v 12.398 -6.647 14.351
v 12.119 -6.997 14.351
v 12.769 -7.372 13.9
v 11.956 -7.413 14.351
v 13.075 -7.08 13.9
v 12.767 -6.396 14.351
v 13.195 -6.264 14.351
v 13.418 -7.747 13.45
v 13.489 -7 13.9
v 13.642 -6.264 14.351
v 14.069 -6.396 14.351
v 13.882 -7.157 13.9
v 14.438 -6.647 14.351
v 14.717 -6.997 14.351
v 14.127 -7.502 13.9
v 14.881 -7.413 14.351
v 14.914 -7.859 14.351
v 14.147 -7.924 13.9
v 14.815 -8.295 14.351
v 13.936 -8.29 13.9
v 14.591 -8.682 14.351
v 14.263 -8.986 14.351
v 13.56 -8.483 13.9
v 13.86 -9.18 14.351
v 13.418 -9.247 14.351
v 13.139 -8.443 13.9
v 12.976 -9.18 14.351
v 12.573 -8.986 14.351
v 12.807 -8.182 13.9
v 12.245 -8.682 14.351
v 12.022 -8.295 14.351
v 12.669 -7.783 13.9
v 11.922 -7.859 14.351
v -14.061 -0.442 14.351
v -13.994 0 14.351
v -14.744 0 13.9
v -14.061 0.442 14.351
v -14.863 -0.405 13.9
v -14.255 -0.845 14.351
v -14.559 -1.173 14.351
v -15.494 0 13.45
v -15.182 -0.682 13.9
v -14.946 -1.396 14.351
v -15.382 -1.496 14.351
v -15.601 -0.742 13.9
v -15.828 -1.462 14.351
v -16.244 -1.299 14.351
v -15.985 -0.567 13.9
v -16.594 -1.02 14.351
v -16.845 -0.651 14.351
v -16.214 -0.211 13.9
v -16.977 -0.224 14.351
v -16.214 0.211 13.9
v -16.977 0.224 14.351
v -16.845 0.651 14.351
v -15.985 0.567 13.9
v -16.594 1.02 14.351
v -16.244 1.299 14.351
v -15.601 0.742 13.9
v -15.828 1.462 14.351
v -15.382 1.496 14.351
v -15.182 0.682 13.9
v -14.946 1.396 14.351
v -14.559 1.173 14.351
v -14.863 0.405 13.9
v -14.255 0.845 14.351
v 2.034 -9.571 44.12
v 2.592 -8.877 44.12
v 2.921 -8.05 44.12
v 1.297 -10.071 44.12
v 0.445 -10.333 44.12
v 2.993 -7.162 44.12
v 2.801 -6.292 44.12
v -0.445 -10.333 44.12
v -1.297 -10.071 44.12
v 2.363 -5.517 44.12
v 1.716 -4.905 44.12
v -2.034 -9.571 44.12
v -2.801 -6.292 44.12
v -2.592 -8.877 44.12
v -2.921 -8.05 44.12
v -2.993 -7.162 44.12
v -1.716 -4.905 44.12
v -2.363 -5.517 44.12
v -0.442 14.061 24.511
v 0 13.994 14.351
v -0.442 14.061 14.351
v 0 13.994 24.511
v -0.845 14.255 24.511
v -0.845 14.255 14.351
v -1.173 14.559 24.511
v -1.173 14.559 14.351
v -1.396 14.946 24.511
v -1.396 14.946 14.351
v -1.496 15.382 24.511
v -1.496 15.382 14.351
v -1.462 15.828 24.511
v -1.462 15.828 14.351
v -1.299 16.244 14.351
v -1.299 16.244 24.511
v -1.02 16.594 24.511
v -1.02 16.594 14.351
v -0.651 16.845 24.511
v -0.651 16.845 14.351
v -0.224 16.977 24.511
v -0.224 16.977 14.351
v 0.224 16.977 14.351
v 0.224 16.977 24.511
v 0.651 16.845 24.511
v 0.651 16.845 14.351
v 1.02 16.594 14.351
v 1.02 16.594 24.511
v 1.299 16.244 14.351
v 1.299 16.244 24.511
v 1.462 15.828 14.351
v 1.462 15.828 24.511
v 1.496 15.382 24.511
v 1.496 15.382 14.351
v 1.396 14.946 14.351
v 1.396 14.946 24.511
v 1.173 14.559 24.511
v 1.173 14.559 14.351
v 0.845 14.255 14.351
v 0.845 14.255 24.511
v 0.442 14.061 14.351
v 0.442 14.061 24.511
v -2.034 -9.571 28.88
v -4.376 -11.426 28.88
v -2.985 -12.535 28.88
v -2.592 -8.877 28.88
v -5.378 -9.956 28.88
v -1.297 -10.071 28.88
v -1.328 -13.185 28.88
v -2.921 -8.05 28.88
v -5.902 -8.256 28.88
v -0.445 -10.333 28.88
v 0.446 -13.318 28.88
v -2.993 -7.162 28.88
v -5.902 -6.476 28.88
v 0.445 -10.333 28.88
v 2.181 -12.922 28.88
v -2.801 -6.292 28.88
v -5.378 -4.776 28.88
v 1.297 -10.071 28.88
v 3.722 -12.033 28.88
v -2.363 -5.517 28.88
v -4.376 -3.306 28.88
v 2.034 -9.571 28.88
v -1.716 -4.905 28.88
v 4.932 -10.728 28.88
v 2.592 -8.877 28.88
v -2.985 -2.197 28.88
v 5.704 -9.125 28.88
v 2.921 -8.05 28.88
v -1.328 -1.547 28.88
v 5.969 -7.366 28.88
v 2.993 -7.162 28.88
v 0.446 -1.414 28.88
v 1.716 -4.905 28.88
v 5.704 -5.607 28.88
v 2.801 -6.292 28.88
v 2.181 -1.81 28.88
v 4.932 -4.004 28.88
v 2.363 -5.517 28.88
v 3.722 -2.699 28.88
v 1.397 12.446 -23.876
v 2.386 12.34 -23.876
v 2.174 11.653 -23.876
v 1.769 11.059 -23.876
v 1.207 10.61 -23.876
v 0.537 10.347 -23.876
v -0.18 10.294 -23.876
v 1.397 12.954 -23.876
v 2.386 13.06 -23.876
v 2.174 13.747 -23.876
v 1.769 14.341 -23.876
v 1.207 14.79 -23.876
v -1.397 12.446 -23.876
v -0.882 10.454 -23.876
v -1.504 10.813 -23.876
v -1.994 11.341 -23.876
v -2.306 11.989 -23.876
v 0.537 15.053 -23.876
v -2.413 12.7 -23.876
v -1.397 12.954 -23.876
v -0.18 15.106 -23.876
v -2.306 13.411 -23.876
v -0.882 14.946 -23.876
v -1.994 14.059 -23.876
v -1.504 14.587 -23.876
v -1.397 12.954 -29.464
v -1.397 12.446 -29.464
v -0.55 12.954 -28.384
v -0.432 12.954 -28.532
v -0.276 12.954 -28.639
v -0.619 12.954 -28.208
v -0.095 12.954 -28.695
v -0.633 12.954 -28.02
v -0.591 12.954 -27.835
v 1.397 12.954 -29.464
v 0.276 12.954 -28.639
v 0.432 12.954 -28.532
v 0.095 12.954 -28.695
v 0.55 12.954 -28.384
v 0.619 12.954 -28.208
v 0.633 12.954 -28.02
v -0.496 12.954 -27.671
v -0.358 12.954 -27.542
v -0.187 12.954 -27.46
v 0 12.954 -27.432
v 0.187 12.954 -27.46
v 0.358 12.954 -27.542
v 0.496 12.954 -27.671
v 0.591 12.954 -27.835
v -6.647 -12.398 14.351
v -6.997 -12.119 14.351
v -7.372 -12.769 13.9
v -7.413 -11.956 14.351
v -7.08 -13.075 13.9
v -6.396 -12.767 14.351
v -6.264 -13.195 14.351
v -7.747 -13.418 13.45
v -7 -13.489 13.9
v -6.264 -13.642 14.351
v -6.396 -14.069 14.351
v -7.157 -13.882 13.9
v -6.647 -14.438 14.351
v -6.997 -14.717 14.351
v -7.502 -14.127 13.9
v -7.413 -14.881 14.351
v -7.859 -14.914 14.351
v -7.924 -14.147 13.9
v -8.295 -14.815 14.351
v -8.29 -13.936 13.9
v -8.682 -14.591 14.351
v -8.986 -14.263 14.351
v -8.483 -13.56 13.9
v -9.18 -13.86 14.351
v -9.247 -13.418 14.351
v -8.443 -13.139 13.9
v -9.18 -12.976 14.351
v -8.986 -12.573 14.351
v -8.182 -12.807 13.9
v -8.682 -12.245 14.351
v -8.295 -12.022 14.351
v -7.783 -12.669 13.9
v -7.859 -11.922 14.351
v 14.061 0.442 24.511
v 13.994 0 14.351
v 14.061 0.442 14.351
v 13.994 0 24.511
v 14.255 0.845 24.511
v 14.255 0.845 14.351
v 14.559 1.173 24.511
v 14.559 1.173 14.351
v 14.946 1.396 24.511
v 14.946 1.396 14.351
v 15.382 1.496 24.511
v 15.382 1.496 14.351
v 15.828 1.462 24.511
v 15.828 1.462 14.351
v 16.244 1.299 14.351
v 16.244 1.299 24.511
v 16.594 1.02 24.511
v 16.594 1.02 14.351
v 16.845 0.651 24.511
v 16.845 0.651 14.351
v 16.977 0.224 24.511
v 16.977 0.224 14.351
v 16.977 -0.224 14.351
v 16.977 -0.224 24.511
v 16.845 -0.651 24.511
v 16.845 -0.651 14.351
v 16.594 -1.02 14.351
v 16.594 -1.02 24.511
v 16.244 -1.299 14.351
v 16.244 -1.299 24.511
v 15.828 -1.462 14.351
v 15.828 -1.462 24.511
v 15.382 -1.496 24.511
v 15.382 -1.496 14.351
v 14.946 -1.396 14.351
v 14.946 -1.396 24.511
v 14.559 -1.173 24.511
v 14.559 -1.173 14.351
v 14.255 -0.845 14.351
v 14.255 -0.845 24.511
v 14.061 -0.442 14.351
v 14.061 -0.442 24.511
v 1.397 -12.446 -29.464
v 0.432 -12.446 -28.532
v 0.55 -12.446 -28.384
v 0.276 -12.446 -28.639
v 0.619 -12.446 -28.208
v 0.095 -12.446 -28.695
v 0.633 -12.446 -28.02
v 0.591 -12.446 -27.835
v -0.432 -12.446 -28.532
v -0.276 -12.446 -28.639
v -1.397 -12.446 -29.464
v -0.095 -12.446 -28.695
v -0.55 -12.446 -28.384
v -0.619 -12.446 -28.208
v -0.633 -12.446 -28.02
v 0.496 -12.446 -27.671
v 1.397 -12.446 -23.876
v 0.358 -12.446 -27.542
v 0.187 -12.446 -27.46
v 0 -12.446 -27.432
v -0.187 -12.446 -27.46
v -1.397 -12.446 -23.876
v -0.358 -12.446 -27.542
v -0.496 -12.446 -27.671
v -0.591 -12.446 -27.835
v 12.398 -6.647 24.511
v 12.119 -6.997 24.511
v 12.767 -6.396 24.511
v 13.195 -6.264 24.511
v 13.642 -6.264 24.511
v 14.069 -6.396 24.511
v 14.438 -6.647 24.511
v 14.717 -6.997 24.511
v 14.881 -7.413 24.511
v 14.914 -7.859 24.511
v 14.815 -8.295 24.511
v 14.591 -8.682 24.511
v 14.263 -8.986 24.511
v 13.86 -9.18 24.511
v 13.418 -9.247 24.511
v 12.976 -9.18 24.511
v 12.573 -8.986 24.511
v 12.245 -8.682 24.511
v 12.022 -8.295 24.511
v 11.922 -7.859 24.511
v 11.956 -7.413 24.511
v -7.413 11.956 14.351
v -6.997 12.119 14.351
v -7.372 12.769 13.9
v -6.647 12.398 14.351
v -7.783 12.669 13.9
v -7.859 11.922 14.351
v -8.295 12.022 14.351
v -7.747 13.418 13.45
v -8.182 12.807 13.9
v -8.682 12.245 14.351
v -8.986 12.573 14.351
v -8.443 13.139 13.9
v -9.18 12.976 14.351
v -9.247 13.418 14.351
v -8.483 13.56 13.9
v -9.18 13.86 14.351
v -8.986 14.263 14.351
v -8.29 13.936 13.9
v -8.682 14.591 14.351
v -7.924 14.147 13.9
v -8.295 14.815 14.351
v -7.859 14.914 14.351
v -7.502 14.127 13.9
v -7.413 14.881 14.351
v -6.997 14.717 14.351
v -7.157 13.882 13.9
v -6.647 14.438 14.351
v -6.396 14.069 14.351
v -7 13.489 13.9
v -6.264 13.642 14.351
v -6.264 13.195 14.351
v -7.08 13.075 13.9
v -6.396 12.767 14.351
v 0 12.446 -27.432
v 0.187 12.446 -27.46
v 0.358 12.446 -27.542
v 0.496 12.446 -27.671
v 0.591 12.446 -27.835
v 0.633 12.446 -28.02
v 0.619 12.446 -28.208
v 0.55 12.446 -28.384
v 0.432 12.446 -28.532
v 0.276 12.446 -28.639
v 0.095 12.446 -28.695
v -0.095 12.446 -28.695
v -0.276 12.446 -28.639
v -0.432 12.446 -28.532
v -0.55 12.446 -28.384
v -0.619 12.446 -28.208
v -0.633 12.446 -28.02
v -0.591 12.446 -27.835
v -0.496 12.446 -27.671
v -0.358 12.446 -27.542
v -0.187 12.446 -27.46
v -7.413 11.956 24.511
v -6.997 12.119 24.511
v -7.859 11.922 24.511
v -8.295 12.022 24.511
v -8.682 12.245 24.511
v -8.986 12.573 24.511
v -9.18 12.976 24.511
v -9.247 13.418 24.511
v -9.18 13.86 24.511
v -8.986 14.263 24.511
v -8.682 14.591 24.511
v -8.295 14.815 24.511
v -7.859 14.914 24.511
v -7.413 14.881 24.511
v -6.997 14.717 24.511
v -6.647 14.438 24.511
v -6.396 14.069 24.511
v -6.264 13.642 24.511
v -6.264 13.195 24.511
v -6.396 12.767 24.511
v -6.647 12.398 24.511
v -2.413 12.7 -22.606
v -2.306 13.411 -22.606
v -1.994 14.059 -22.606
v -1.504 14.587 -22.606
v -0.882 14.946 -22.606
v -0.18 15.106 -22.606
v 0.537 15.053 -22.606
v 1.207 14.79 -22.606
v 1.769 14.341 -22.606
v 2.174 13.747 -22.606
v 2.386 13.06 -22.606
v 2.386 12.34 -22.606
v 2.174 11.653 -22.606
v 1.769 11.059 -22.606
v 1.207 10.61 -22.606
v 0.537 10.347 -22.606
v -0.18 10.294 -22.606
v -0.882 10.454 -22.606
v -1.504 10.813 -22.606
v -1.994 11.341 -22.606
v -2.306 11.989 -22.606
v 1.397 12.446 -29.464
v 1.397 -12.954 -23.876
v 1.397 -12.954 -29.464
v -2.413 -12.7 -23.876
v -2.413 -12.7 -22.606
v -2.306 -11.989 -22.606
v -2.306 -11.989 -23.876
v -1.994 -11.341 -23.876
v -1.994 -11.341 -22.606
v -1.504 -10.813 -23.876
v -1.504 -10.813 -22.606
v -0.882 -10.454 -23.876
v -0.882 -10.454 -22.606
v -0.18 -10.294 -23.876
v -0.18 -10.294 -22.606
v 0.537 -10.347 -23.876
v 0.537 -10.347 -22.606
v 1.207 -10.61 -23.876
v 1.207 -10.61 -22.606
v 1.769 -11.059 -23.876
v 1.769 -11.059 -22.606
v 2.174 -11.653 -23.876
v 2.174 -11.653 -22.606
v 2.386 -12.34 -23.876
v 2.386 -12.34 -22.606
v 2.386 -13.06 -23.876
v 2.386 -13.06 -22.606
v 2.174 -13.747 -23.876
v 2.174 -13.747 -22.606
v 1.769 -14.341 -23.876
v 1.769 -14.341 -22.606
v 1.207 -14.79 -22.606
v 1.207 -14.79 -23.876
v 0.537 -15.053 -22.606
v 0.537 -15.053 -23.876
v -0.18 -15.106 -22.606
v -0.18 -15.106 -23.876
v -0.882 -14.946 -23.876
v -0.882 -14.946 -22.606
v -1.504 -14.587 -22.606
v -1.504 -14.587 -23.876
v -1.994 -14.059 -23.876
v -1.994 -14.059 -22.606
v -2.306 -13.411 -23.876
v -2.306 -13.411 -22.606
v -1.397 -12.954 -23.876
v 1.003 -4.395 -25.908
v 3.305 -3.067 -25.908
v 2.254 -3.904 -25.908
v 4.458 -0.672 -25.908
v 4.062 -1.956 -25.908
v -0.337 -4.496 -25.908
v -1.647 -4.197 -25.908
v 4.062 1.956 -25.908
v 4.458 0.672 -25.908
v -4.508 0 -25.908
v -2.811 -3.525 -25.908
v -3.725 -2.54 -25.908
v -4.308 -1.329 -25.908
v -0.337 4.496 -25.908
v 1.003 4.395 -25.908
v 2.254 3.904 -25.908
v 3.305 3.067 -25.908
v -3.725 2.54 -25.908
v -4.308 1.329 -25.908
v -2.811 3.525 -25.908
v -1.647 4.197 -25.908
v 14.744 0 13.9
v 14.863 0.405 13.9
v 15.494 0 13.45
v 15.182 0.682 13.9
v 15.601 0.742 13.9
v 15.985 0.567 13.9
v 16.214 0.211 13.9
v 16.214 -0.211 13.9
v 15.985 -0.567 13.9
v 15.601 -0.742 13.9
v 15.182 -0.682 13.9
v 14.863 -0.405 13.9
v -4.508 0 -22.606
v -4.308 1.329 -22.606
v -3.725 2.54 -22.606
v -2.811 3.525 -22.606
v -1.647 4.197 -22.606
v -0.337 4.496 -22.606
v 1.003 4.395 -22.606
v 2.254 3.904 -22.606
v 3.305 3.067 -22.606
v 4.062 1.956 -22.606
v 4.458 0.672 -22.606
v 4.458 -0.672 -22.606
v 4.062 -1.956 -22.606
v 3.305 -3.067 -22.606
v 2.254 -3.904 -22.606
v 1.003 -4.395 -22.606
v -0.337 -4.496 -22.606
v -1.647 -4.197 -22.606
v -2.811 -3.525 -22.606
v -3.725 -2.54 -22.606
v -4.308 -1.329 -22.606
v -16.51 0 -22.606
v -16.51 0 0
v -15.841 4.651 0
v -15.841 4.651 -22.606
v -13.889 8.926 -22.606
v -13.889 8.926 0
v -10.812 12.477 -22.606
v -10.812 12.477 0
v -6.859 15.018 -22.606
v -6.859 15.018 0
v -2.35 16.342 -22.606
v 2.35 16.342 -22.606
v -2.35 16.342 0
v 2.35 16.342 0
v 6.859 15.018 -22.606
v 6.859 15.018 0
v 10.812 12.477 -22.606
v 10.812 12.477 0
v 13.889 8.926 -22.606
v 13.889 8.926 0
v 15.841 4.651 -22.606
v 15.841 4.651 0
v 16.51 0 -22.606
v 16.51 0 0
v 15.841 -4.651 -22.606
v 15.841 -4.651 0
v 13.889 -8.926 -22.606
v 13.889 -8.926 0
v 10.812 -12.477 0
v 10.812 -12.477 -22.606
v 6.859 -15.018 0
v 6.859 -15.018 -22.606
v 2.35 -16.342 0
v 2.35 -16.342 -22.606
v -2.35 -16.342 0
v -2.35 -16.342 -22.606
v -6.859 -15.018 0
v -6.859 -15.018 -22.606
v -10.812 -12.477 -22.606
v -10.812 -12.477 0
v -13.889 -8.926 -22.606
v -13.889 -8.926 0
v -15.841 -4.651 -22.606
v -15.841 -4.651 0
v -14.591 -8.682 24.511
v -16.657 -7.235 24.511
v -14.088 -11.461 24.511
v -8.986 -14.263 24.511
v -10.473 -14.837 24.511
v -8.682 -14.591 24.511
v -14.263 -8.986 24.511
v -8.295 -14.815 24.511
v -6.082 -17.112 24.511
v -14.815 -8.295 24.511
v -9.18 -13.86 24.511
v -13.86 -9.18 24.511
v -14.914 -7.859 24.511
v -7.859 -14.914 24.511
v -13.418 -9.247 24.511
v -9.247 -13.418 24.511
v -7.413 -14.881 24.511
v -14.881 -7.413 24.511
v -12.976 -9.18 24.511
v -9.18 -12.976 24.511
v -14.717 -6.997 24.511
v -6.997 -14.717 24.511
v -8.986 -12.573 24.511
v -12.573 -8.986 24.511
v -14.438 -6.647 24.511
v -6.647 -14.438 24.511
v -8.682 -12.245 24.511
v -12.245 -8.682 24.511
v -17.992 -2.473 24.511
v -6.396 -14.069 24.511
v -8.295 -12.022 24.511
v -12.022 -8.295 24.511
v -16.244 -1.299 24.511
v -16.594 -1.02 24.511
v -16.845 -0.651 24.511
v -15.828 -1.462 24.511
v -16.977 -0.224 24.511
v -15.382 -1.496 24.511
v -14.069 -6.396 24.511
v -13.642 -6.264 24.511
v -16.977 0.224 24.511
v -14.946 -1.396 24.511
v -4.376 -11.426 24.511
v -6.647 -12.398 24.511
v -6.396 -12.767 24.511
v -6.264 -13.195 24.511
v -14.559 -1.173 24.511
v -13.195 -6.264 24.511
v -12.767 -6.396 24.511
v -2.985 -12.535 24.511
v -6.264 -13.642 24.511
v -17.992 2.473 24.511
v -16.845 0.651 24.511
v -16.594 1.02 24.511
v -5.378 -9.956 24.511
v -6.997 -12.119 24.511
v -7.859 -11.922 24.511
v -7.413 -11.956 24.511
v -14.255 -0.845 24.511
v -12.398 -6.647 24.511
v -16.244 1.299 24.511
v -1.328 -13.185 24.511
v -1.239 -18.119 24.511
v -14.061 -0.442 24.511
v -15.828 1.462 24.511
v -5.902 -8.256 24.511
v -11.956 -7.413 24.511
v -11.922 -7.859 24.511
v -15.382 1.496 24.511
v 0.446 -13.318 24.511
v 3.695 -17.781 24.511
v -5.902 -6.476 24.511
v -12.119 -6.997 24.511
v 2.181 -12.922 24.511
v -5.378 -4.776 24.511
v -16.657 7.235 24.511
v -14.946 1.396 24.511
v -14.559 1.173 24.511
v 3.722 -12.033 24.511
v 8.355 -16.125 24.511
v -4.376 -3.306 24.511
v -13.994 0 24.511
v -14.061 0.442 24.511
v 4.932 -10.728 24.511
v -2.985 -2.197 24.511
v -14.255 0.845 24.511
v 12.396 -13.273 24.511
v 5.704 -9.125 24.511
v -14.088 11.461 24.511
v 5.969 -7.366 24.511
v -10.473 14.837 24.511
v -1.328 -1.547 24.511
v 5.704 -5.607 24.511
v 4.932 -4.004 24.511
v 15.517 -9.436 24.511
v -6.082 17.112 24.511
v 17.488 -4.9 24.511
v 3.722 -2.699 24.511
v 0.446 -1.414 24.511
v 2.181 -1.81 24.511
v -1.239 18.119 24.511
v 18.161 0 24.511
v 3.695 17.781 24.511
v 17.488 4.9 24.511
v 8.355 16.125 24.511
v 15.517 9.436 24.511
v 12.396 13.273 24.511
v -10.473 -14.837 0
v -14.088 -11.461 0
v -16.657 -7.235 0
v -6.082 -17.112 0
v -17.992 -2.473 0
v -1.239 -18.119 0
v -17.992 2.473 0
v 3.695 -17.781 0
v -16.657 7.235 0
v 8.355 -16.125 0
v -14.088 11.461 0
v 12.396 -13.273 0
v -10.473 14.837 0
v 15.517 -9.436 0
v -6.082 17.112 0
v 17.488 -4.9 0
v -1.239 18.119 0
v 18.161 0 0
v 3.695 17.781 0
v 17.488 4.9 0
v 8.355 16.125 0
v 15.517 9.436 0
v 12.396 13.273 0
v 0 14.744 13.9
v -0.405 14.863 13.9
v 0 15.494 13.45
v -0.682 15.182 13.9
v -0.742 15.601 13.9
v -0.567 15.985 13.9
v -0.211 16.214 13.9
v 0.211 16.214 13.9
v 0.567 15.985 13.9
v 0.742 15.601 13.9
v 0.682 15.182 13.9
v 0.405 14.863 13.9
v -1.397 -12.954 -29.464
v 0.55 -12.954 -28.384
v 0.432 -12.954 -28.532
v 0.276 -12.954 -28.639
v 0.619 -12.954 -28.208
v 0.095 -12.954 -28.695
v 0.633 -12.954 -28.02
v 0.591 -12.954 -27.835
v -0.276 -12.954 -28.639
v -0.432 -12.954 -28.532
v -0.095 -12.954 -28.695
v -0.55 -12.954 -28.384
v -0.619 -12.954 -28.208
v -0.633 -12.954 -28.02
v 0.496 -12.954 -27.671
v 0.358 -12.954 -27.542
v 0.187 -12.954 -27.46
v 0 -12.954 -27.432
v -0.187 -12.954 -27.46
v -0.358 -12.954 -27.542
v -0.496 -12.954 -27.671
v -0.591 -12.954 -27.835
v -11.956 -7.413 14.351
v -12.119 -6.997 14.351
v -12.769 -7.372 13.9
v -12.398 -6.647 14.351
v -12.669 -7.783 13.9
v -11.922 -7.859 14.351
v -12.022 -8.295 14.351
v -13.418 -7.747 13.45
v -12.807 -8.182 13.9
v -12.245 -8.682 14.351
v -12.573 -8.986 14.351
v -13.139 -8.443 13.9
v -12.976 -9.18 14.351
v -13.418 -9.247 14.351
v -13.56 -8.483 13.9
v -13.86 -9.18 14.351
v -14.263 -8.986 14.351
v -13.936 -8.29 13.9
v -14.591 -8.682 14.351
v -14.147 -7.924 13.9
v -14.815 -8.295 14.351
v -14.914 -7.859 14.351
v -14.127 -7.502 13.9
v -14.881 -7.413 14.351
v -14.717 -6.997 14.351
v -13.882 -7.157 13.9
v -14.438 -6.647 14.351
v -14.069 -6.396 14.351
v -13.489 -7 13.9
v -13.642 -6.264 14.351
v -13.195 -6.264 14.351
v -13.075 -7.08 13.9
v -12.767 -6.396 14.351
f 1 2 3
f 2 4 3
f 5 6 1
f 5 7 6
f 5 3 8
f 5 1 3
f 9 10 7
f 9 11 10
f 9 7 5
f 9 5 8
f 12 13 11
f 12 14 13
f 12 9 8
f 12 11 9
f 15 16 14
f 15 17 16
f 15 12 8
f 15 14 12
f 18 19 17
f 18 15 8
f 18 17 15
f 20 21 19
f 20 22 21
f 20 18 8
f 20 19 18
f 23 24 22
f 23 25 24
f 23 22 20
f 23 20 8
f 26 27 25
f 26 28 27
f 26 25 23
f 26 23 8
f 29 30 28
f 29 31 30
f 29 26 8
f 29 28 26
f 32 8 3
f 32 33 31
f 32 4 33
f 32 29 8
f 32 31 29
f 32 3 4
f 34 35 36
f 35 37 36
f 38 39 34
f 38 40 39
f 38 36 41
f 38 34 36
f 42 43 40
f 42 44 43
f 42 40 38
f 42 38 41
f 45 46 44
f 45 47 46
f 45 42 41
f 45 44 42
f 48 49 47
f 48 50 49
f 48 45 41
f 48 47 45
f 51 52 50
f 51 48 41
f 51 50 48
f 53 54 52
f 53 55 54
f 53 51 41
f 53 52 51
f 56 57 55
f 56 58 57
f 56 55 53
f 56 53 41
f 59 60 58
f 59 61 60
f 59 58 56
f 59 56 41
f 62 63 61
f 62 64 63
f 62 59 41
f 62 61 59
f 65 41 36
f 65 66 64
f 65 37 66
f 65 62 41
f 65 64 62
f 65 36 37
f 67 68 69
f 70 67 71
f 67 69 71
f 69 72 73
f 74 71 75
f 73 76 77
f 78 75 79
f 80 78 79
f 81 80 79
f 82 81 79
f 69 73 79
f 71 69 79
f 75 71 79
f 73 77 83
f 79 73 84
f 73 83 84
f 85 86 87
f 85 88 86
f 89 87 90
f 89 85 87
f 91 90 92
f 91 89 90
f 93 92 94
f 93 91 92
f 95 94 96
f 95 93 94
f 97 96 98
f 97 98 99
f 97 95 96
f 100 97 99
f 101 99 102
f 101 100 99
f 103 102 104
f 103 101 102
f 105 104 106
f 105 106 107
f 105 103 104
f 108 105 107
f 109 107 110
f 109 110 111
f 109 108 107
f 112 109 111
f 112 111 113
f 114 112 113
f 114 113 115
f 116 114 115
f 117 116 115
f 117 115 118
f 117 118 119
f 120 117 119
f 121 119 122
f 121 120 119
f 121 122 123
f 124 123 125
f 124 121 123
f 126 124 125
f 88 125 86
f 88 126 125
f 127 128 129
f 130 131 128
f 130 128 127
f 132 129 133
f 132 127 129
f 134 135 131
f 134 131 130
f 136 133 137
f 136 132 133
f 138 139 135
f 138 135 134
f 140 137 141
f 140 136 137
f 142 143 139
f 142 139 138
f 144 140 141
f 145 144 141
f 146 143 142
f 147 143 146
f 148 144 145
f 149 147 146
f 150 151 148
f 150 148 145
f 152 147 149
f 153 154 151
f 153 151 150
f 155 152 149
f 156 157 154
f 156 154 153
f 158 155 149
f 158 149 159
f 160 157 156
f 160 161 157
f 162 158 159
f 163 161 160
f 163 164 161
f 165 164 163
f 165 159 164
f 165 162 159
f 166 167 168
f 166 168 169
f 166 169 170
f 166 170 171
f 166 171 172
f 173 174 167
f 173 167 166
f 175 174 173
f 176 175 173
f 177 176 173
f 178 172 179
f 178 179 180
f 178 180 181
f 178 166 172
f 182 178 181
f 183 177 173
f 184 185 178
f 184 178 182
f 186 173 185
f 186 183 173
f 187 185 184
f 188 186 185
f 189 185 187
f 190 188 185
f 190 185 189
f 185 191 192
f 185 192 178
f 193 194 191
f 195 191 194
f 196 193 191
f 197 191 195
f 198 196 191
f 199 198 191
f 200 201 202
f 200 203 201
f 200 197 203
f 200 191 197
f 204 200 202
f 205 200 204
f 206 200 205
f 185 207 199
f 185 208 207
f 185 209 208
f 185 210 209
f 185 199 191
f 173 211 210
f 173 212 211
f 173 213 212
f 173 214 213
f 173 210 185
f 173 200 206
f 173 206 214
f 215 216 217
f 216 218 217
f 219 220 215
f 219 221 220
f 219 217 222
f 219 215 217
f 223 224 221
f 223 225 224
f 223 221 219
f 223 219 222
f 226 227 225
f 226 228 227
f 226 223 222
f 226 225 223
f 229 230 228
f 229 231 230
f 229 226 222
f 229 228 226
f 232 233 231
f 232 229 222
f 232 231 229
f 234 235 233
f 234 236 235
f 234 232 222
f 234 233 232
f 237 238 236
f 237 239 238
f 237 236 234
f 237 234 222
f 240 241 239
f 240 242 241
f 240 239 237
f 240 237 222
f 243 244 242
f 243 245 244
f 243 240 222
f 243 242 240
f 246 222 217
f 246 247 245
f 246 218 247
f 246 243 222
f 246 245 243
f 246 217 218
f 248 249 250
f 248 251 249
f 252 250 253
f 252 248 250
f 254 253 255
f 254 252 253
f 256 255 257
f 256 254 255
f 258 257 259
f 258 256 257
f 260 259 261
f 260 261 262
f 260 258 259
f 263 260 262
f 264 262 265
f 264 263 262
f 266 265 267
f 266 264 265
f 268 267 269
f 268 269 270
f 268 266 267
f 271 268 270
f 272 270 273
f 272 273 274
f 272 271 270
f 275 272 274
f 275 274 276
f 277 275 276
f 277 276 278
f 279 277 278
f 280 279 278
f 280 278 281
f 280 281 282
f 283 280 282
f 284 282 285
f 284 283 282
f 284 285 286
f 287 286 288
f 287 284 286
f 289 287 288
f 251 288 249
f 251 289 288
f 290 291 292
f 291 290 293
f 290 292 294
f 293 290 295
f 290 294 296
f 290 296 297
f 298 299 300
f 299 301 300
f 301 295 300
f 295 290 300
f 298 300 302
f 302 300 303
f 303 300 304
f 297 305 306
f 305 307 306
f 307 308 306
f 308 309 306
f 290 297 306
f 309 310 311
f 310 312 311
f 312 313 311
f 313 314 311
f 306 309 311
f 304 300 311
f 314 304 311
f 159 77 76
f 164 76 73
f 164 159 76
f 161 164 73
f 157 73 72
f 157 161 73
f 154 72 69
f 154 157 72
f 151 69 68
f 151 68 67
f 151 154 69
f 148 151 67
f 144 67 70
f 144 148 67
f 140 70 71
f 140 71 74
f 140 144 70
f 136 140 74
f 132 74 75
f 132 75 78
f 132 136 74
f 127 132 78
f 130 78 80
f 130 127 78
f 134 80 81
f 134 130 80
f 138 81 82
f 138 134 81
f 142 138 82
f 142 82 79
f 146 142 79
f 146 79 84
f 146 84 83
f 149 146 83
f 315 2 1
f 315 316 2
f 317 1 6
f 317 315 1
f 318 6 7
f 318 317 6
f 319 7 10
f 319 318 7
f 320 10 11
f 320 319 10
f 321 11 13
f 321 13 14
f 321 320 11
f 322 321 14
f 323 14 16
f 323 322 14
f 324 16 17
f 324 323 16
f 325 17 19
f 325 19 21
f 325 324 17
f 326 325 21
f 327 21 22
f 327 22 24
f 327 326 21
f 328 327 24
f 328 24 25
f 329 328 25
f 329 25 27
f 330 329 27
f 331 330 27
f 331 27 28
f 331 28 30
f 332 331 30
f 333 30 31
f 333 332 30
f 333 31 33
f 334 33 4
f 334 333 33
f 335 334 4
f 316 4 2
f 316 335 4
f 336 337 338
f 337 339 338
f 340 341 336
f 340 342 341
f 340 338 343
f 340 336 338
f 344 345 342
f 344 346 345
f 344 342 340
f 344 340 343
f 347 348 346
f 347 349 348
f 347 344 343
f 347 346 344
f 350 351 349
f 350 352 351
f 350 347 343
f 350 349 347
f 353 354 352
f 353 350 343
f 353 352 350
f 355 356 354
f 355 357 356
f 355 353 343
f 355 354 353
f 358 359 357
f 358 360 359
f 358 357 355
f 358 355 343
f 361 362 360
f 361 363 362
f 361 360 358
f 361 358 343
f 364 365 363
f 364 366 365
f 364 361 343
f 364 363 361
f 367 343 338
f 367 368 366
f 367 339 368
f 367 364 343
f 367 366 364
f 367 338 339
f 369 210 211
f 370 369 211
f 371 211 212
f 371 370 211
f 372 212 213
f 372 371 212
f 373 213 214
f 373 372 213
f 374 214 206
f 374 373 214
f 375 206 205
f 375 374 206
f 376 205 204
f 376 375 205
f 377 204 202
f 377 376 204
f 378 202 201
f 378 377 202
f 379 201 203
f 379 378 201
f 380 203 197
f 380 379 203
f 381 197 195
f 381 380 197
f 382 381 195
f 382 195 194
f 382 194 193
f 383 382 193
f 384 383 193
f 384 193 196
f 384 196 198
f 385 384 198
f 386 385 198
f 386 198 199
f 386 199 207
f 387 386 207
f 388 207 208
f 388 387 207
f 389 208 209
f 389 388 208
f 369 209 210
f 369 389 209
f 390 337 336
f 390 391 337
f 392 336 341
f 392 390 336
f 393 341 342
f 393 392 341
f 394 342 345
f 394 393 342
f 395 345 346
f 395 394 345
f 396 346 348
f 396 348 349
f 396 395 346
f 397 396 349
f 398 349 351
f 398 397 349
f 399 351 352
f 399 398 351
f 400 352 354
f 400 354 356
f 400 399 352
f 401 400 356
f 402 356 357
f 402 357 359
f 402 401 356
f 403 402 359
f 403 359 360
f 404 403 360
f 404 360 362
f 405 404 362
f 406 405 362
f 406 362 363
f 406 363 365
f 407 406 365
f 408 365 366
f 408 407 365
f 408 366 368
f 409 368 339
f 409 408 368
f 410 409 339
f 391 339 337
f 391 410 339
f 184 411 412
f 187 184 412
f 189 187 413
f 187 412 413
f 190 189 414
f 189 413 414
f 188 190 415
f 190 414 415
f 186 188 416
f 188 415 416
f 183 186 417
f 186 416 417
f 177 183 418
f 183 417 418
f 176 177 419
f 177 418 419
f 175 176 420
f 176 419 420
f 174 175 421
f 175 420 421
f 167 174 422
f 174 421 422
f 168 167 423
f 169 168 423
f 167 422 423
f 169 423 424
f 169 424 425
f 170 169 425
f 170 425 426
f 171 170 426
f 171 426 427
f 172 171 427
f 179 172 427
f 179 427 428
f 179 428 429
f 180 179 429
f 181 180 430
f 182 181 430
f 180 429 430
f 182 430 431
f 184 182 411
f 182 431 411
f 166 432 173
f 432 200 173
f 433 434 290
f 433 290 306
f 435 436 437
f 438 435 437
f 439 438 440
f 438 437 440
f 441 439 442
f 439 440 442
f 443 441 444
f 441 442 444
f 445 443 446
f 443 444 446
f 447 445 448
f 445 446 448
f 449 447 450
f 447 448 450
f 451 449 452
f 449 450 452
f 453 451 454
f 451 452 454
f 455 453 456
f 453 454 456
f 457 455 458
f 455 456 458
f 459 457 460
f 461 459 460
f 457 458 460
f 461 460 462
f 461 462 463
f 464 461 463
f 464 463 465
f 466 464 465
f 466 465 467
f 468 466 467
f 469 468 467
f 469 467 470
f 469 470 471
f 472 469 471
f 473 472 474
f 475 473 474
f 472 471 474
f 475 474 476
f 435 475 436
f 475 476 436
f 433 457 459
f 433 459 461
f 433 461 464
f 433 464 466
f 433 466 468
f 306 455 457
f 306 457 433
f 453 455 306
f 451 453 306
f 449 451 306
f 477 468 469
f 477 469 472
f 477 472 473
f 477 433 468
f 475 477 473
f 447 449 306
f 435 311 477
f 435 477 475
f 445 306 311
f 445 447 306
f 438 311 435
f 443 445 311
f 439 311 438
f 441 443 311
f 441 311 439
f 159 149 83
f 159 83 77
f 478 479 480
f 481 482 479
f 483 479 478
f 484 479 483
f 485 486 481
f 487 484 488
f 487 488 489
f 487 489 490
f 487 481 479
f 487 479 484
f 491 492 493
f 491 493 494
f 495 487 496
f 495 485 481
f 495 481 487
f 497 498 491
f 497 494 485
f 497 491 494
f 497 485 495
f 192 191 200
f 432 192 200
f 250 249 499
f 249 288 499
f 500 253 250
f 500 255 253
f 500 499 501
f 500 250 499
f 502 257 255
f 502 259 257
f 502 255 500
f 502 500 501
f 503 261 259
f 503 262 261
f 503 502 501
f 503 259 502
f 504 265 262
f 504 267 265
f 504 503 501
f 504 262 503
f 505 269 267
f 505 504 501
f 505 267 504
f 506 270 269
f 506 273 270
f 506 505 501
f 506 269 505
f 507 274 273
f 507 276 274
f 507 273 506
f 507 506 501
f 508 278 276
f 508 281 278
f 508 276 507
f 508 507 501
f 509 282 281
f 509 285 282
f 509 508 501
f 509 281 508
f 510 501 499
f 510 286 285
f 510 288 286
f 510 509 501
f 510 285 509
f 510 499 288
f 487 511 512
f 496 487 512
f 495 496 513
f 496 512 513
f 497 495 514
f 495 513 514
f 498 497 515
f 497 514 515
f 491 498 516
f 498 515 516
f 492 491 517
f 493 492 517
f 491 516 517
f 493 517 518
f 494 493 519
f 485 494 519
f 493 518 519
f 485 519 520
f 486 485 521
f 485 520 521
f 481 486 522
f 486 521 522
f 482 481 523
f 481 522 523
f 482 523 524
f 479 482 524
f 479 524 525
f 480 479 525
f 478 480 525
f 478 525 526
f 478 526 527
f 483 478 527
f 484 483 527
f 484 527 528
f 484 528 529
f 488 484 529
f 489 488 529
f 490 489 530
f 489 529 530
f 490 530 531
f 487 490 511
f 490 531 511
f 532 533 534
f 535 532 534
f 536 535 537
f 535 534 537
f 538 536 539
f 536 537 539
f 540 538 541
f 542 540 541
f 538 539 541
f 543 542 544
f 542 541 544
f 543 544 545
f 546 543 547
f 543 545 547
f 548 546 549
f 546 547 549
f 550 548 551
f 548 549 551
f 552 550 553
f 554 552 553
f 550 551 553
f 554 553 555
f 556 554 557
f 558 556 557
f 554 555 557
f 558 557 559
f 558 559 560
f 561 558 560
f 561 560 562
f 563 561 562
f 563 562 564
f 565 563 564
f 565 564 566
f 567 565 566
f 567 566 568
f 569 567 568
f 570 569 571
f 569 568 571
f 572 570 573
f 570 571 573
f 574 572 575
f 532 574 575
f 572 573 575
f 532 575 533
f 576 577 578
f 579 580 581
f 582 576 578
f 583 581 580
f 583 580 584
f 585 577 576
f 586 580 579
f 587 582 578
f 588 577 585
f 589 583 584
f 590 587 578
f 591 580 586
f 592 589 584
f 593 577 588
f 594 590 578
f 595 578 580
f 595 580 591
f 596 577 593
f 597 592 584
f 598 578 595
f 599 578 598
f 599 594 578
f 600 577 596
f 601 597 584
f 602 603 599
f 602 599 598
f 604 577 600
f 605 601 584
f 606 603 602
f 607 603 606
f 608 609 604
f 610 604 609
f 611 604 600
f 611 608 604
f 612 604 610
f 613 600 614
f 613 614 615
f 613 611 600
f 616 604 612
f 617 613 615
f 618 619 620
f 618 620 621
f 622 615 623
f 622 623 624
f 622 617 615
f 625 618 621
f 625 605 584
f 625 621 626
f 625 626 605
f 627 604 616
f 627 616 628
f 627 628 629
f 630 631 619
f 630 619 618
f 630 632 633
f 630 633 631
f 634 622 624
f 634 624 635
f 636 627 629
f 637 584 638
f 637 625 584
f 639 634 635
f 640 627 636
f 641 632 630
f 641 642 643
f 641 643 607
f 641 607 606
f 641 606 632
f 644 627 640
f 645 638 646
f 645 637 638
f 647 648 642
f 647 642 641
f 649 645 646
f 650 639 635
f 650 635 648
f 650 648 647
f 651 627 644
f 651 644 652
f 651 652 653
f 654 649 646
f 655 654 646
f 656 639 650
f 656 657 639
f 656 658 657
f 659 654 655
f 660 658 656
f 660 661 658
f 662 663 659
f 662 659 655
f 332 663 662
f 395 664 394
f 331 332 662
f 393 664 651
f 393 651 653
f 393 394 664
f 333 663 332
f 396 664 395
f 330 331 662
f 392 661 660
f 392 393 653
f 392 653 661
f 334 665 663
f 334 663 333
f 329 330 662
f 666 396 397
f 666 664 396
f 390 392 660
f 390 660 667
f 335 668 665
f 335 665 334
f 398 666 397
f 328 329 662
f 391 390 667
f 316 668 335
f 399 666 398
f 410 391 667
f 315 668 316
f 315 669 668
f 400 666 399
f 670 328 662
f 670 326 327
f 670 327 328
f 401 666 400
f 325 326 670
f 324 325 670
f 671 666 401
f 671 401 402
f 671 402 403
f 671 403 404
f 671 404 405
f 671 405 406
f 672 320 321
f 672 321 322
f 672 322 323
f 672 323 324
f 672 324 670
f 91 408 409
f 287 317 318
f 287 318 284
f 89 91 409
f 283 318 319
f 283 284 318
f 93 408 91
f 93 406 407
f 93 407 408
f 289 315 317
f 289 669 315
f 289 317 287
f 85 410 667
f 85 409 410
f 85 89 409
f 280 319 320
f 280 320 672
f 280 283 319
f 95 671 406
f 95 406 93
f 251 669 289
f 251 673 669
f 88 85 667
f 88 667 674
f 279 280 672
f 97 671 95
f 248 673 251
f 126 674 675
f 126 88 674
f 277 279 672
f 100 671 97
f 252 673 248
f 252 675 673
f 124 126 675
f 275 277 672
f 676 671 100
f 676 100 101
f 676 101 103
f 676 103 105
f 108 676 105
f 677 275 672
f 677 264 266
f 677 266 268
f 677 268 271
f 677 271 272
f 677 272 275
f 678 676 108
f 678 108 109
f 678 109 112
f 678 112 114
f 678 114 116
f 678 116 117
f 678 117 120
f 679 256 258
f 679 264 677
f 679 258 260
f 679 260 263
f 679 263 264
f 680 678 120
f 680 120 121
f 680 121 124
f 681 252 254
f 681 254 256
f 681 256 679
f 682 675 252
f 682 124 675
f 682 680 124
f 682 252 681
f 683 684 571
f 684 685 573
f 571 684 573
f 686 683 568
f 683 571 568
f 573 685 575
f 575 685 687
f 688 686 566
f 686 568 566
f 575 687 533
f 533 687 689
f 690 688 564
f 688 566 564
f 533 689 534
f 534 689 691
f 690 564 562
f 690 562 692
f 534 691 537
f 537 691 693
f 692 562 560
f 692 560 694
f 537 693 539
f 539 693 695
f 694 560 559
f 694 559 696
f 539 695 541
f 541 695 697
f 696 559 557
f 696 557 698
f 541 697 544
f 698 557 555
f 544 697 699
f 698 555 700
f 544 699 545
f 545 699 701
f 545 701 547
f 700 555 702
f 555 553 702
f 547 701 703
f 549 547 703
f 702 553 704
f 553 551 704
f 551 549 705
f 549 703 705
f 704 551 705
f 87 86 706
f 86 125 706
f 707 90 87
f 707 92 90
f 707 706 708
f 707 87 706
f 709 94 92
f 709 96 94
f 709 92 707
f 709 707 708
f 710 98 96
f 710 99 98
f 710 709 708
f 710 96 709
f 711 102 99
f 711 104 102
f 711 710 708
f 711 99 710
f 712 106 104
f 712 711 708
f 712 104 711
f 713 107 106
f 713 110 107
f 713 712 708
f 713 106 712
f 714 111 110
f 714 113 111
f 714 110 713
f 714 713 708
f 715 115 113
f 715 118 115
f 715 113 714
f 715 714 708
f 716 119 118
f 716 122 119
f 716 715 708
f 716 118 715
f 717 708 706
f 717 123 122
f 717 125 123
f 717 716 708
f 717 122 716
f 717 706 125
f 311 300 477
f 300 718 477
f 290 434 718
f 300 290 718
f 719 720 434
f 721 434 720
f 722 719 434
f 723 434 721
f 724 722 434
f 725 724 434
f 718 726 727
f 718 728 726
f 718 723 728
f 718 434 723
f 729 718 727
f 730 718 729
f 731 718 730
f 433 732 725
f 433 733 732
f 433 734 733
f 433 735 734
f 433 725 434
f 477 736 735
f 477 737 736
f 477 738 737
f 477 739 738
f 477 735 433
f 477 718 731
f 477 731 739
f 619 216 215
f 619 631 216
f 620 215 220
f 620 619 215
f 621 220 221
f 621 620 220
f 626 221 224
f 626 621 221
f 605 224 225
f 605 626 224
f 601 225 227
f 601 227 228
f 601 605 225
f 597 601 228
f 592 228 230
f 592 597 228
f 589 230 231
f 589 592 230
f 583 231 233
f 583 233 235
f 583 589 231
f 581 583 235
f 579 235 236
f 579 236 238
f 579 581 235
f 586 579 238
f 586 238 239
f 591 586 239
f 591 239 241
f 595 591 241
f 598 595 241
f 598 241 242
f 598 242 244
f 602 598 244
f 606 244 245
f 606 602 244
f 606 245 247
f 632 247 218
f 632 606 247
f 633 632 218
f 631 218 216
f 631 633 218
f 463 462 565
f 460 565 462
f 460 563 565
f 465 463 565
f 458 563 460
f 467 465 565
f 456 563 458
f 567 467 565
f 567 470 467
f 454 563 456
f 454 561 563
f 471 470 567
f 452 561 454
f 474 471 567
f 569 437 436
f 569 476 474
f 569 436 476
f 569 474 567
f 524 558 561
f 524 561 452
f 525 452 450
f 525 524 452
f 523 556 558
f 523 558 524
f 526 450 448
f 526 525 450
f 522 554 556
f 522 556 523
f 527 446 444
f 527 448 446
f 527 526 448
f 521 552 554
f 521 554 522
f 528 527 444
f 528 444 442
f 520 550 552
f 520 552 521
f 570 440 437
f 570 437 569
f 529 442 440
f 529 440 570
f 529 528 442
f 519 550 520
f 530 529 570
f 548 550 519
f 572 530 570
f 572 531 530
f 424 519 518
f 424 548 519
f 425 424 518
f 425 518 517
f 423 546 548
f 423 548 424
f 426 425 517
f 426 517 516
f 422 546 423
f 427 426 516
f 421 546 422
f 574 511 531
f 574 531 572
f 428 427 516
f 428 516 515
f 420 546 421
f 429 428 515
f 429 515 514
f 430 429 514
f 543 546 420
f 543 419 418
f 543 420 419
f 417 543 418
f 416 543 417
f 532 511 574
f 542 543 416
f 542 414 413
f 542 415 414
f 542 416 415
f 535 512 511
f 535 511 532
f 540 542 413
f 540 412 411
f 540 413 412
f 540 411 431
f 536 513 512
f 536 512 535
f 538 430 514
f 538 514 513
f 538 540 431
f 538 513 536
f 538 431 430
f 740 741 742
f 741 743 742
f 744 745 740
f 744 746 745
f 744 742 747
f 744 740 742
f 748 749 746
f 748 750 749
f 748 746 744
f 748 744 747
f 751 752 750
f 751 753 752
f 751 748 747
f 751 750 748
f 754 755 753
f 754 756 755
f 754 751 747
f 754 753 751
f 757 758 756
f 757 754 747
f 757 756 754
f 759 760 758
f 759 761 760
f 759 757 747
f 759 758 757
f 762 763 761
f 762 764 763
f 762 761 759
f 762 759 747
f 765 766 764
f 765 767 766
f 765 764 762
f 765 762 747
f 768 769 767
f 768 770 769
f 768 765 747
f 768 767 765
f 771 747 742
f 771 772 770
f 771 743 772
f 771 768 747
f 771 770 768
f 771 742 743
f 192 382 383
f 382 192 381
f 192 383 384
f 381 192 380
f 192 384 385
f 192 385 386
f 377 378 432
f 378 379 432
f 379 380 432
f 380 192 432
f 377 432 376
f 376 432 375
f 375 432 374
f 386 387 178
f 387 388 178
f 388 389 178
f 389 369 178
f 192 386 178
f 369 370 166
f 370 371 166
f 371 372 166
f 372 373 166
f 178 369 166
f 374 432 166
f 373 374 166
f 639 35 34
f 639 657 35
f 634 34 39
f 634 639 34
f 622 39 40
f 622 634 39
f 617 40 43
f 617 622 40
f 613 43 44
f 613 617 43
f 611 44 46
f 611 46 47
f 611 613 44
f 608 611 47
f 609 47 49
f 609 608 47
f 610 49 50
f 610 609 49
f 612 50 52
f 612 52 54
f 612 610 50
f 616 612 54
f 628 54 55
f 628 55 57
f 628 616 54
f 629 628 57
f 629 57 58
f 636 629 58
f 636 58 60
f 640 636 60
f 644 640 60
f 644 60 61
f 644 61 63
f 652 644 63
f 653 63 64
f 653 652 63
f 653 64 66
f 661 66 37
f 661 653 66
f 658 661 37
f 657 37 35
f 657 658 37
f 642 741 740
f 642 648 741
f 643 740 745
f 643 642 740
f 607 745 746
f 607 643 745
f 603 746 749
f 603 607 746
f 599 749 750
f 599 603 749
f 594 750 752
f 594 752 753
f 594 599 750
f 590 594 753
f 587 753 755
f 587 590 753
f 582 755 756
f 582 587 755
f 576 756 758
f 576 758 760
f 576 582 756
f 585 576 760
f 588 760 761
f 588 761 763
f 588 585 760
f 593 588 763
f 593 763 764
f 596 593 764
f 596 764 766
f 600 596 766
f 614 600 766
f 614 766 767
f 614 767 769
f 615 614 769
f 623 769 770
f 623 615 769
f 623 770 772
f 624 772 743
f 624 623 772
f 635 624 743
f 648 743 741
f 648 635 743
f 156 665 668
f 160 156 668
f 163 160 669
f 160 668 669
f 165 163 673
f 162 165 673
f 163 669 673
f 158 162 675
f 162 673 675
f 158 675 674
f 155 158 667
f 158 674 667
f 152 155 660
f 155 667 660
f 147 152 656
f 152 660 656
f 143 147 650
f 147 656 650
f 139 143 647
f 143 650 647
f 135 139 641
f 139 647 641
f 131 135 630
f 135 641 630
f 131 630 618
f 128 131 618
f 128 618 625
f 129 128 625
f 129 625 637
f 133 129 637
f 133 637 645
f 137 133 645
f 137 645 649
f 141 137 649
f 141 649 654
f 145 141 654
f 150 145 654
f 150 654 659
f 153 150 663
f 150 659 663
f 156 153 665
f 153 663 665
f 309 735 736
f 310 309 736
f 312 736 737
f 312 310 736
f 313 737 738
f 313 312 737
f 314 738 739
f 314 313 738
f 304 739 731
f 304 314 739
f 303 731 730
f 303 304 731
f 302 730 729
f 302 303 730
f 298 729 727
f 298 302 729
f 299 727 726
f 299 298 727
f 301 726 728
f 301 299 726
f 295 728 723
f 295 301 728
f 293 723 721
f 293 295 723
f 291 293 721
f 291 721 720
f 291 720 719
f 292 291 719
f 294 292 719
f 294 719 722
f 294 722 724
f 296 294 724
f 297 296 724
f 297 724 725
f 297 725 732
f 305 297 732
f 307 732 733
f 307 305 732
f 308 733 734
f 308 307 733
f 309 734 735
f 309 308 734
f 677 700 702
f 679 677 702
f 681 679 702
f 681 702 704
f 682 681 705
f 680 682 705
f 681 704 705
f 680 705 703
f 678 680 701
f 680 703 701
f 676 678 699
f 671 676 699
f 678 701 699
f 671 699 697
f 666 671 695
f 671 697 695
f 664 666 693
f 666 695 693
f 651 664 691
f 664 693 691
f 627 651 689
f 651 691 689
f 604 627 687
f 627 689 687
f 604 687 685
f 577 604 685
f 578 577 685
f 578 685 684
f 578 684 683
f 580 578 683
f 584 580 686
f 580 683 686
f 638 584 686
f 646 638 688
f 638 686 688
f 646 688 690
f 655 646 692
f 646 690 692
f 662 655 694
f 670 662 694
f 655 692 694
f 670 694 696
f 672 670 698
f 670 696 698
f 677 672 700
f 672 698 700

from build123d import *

# Parameters (mm, degrees)
SKETCH1_R           = 18.161
BOSS_EXTRUDE1_DEPTH = 24.511
SKETCH2_R           = 16.51
BOSS_EXTRUDE2_DEPTH = 22.606
SKETCH3_R           = 4.5085
BOSS_EXTRUDE3_DEPTH = 3.302
SKETCH4_R           = 2.413
BOSS_EXTRUDE4_DEPTH = 1.27
SKETCH5_R           = 5.969
BOSS_EXTRUDE5_DEPTH = 4.3688
BOSS_EXTRUDE6_DEPTH = 15.24
SKETCH8_W           = 5.588
SKETCH8_H           = 2.794
SKETCH8_R           = 0.635
BOSS_EXTRUDE7_DEPTH = 0.254
CIRPATTERN1_COUNT   = 2
CIRPATTERN2_COUNT   = 12


with BuildPart() as part:
    # Sketch1 → Boss-Extrude1 (new body)
    with BuildSketch(Plane.XY):
        Circle(SKETCH1_R)
    extrude(amount=BOSS_EXTRUDE1_DEPTH)

    # Sketch2 → Boss-Extrude2 (add)
    with BuildSketch(Plane(origin=(0, 0, 0), x_dir=(-1, 0, 0), z_dir=(0, 0, -1))):
        Circle(SKETCH2_R)
    extrude(amount=BOSS_EXTRUDE2_DEPTH)

    # Sketch3 → Boss-Extrude3 (add)
    with BuildSketch(Plane(origin=(0, 0, -22.606), x_dir=(-1, 0, 0), z_dir=(0, 0, -1))):
        Circle(SKETCH3_R)
    extrude(amount=BOSS_EXTRUDE3_DEPTH)

    # Sketch4 → Boss-Extrude4 (add)
    with BuildSketch(Plane(origin=(0, 0, -22.606), x_dir=(-1, 0, 0), z_dir=(0, 0, -1))):
        with Locations((0, -12.7)):
            Circle(SKETCH4_R)
        with Locations((0, 12.7)):
            Circle(SKETCH4_R)
    extrude(amount=BOSS_EXTRUDE4_DEPTH)

    # Sketch5 → Boss-Extrude5 (add)
    with BuildSketch(Plane.XY.offset(24.511)):
        with Locations((0, -7.366)):
            Circle(SKETCH5_R)
    extrude(amount=BOSS_EXTRUDE5_DEPTH)

    # Sketch6 → Boss-Extrude6 (add)
    with BuildSketch(Plane.XY.offset(28.8798)):
        with BuildLine():
            Line((-1.715657017, -4.905), (1.715657017, -4.905))
            ThreePointArc((1.715657017, -4.905), (0, -10.366), (-1.715657017, -4.905))
        make_face()
    extrude(amount=BOSS_EXTRUDE6_DEPTH)

    # Sketch8 → Boss-Extrude7 (add, symmetric)
    with BuildSketch(Plane.ZX.offset(12.7)):
        with Locations((-26.67, 0)):
            Rectangle(SKETCH8_W, SKETCH8_H)
        with Locations((-28.067, 0)):
            Circle(SKETCH8_R, mode=Mode.SUBTRACT)
    boss_extrude7 = extrude(amount=BOSS_EXTRUDE7_DEPTH, both=True)

    # CirPattern1: Boss-Extrude7 ×2 about axis
    cirpattern1_axis = Axis((0, 0, -25.908), (0, 0, 1))
    for i in range(1, CIRPATTERN1_COUNT):
        add(boss_extrude7.rotate(cirpattern1_axis, i * 360 / CIRPATTERN1_COUNT))

    # Sketch12 → Ø3.0mm Dowel Hole1 (revolve, cut)
    with BuildSketch(Plane(origin=(0, 15.494, 24.511), x_dir=(0, -1, 0), z_dir=(1, 0, 0))):
        Polygon((0, 0), (0, 11.061290929), (1.5, 10.16), (1.5, 0), align=None)
    f_3_0mm_dowel_hole1 = revolve(axis=Axis((0, 15.494, 30.861), (0, 0, -1)), mode=Mode.SUBTRACT)

    # CirPattern2: Ø3.0mm Dowel Hole1 ×12 about axis, 5 skipped
    cirpattern2_axis = Axis((0, 0, 24.511), (0, 0, -1))
    add([f_3_0mm_dowel_hole1.rotate(cirpattern2_axis, i * 360 / CIRPATTERN2_COUNT) for i in range(1, CIRPATTERN2_COUNT) if i not in (1, 2, 5, 6, 10)], mode=Mode.SUBTRACT)


solid = part.part
